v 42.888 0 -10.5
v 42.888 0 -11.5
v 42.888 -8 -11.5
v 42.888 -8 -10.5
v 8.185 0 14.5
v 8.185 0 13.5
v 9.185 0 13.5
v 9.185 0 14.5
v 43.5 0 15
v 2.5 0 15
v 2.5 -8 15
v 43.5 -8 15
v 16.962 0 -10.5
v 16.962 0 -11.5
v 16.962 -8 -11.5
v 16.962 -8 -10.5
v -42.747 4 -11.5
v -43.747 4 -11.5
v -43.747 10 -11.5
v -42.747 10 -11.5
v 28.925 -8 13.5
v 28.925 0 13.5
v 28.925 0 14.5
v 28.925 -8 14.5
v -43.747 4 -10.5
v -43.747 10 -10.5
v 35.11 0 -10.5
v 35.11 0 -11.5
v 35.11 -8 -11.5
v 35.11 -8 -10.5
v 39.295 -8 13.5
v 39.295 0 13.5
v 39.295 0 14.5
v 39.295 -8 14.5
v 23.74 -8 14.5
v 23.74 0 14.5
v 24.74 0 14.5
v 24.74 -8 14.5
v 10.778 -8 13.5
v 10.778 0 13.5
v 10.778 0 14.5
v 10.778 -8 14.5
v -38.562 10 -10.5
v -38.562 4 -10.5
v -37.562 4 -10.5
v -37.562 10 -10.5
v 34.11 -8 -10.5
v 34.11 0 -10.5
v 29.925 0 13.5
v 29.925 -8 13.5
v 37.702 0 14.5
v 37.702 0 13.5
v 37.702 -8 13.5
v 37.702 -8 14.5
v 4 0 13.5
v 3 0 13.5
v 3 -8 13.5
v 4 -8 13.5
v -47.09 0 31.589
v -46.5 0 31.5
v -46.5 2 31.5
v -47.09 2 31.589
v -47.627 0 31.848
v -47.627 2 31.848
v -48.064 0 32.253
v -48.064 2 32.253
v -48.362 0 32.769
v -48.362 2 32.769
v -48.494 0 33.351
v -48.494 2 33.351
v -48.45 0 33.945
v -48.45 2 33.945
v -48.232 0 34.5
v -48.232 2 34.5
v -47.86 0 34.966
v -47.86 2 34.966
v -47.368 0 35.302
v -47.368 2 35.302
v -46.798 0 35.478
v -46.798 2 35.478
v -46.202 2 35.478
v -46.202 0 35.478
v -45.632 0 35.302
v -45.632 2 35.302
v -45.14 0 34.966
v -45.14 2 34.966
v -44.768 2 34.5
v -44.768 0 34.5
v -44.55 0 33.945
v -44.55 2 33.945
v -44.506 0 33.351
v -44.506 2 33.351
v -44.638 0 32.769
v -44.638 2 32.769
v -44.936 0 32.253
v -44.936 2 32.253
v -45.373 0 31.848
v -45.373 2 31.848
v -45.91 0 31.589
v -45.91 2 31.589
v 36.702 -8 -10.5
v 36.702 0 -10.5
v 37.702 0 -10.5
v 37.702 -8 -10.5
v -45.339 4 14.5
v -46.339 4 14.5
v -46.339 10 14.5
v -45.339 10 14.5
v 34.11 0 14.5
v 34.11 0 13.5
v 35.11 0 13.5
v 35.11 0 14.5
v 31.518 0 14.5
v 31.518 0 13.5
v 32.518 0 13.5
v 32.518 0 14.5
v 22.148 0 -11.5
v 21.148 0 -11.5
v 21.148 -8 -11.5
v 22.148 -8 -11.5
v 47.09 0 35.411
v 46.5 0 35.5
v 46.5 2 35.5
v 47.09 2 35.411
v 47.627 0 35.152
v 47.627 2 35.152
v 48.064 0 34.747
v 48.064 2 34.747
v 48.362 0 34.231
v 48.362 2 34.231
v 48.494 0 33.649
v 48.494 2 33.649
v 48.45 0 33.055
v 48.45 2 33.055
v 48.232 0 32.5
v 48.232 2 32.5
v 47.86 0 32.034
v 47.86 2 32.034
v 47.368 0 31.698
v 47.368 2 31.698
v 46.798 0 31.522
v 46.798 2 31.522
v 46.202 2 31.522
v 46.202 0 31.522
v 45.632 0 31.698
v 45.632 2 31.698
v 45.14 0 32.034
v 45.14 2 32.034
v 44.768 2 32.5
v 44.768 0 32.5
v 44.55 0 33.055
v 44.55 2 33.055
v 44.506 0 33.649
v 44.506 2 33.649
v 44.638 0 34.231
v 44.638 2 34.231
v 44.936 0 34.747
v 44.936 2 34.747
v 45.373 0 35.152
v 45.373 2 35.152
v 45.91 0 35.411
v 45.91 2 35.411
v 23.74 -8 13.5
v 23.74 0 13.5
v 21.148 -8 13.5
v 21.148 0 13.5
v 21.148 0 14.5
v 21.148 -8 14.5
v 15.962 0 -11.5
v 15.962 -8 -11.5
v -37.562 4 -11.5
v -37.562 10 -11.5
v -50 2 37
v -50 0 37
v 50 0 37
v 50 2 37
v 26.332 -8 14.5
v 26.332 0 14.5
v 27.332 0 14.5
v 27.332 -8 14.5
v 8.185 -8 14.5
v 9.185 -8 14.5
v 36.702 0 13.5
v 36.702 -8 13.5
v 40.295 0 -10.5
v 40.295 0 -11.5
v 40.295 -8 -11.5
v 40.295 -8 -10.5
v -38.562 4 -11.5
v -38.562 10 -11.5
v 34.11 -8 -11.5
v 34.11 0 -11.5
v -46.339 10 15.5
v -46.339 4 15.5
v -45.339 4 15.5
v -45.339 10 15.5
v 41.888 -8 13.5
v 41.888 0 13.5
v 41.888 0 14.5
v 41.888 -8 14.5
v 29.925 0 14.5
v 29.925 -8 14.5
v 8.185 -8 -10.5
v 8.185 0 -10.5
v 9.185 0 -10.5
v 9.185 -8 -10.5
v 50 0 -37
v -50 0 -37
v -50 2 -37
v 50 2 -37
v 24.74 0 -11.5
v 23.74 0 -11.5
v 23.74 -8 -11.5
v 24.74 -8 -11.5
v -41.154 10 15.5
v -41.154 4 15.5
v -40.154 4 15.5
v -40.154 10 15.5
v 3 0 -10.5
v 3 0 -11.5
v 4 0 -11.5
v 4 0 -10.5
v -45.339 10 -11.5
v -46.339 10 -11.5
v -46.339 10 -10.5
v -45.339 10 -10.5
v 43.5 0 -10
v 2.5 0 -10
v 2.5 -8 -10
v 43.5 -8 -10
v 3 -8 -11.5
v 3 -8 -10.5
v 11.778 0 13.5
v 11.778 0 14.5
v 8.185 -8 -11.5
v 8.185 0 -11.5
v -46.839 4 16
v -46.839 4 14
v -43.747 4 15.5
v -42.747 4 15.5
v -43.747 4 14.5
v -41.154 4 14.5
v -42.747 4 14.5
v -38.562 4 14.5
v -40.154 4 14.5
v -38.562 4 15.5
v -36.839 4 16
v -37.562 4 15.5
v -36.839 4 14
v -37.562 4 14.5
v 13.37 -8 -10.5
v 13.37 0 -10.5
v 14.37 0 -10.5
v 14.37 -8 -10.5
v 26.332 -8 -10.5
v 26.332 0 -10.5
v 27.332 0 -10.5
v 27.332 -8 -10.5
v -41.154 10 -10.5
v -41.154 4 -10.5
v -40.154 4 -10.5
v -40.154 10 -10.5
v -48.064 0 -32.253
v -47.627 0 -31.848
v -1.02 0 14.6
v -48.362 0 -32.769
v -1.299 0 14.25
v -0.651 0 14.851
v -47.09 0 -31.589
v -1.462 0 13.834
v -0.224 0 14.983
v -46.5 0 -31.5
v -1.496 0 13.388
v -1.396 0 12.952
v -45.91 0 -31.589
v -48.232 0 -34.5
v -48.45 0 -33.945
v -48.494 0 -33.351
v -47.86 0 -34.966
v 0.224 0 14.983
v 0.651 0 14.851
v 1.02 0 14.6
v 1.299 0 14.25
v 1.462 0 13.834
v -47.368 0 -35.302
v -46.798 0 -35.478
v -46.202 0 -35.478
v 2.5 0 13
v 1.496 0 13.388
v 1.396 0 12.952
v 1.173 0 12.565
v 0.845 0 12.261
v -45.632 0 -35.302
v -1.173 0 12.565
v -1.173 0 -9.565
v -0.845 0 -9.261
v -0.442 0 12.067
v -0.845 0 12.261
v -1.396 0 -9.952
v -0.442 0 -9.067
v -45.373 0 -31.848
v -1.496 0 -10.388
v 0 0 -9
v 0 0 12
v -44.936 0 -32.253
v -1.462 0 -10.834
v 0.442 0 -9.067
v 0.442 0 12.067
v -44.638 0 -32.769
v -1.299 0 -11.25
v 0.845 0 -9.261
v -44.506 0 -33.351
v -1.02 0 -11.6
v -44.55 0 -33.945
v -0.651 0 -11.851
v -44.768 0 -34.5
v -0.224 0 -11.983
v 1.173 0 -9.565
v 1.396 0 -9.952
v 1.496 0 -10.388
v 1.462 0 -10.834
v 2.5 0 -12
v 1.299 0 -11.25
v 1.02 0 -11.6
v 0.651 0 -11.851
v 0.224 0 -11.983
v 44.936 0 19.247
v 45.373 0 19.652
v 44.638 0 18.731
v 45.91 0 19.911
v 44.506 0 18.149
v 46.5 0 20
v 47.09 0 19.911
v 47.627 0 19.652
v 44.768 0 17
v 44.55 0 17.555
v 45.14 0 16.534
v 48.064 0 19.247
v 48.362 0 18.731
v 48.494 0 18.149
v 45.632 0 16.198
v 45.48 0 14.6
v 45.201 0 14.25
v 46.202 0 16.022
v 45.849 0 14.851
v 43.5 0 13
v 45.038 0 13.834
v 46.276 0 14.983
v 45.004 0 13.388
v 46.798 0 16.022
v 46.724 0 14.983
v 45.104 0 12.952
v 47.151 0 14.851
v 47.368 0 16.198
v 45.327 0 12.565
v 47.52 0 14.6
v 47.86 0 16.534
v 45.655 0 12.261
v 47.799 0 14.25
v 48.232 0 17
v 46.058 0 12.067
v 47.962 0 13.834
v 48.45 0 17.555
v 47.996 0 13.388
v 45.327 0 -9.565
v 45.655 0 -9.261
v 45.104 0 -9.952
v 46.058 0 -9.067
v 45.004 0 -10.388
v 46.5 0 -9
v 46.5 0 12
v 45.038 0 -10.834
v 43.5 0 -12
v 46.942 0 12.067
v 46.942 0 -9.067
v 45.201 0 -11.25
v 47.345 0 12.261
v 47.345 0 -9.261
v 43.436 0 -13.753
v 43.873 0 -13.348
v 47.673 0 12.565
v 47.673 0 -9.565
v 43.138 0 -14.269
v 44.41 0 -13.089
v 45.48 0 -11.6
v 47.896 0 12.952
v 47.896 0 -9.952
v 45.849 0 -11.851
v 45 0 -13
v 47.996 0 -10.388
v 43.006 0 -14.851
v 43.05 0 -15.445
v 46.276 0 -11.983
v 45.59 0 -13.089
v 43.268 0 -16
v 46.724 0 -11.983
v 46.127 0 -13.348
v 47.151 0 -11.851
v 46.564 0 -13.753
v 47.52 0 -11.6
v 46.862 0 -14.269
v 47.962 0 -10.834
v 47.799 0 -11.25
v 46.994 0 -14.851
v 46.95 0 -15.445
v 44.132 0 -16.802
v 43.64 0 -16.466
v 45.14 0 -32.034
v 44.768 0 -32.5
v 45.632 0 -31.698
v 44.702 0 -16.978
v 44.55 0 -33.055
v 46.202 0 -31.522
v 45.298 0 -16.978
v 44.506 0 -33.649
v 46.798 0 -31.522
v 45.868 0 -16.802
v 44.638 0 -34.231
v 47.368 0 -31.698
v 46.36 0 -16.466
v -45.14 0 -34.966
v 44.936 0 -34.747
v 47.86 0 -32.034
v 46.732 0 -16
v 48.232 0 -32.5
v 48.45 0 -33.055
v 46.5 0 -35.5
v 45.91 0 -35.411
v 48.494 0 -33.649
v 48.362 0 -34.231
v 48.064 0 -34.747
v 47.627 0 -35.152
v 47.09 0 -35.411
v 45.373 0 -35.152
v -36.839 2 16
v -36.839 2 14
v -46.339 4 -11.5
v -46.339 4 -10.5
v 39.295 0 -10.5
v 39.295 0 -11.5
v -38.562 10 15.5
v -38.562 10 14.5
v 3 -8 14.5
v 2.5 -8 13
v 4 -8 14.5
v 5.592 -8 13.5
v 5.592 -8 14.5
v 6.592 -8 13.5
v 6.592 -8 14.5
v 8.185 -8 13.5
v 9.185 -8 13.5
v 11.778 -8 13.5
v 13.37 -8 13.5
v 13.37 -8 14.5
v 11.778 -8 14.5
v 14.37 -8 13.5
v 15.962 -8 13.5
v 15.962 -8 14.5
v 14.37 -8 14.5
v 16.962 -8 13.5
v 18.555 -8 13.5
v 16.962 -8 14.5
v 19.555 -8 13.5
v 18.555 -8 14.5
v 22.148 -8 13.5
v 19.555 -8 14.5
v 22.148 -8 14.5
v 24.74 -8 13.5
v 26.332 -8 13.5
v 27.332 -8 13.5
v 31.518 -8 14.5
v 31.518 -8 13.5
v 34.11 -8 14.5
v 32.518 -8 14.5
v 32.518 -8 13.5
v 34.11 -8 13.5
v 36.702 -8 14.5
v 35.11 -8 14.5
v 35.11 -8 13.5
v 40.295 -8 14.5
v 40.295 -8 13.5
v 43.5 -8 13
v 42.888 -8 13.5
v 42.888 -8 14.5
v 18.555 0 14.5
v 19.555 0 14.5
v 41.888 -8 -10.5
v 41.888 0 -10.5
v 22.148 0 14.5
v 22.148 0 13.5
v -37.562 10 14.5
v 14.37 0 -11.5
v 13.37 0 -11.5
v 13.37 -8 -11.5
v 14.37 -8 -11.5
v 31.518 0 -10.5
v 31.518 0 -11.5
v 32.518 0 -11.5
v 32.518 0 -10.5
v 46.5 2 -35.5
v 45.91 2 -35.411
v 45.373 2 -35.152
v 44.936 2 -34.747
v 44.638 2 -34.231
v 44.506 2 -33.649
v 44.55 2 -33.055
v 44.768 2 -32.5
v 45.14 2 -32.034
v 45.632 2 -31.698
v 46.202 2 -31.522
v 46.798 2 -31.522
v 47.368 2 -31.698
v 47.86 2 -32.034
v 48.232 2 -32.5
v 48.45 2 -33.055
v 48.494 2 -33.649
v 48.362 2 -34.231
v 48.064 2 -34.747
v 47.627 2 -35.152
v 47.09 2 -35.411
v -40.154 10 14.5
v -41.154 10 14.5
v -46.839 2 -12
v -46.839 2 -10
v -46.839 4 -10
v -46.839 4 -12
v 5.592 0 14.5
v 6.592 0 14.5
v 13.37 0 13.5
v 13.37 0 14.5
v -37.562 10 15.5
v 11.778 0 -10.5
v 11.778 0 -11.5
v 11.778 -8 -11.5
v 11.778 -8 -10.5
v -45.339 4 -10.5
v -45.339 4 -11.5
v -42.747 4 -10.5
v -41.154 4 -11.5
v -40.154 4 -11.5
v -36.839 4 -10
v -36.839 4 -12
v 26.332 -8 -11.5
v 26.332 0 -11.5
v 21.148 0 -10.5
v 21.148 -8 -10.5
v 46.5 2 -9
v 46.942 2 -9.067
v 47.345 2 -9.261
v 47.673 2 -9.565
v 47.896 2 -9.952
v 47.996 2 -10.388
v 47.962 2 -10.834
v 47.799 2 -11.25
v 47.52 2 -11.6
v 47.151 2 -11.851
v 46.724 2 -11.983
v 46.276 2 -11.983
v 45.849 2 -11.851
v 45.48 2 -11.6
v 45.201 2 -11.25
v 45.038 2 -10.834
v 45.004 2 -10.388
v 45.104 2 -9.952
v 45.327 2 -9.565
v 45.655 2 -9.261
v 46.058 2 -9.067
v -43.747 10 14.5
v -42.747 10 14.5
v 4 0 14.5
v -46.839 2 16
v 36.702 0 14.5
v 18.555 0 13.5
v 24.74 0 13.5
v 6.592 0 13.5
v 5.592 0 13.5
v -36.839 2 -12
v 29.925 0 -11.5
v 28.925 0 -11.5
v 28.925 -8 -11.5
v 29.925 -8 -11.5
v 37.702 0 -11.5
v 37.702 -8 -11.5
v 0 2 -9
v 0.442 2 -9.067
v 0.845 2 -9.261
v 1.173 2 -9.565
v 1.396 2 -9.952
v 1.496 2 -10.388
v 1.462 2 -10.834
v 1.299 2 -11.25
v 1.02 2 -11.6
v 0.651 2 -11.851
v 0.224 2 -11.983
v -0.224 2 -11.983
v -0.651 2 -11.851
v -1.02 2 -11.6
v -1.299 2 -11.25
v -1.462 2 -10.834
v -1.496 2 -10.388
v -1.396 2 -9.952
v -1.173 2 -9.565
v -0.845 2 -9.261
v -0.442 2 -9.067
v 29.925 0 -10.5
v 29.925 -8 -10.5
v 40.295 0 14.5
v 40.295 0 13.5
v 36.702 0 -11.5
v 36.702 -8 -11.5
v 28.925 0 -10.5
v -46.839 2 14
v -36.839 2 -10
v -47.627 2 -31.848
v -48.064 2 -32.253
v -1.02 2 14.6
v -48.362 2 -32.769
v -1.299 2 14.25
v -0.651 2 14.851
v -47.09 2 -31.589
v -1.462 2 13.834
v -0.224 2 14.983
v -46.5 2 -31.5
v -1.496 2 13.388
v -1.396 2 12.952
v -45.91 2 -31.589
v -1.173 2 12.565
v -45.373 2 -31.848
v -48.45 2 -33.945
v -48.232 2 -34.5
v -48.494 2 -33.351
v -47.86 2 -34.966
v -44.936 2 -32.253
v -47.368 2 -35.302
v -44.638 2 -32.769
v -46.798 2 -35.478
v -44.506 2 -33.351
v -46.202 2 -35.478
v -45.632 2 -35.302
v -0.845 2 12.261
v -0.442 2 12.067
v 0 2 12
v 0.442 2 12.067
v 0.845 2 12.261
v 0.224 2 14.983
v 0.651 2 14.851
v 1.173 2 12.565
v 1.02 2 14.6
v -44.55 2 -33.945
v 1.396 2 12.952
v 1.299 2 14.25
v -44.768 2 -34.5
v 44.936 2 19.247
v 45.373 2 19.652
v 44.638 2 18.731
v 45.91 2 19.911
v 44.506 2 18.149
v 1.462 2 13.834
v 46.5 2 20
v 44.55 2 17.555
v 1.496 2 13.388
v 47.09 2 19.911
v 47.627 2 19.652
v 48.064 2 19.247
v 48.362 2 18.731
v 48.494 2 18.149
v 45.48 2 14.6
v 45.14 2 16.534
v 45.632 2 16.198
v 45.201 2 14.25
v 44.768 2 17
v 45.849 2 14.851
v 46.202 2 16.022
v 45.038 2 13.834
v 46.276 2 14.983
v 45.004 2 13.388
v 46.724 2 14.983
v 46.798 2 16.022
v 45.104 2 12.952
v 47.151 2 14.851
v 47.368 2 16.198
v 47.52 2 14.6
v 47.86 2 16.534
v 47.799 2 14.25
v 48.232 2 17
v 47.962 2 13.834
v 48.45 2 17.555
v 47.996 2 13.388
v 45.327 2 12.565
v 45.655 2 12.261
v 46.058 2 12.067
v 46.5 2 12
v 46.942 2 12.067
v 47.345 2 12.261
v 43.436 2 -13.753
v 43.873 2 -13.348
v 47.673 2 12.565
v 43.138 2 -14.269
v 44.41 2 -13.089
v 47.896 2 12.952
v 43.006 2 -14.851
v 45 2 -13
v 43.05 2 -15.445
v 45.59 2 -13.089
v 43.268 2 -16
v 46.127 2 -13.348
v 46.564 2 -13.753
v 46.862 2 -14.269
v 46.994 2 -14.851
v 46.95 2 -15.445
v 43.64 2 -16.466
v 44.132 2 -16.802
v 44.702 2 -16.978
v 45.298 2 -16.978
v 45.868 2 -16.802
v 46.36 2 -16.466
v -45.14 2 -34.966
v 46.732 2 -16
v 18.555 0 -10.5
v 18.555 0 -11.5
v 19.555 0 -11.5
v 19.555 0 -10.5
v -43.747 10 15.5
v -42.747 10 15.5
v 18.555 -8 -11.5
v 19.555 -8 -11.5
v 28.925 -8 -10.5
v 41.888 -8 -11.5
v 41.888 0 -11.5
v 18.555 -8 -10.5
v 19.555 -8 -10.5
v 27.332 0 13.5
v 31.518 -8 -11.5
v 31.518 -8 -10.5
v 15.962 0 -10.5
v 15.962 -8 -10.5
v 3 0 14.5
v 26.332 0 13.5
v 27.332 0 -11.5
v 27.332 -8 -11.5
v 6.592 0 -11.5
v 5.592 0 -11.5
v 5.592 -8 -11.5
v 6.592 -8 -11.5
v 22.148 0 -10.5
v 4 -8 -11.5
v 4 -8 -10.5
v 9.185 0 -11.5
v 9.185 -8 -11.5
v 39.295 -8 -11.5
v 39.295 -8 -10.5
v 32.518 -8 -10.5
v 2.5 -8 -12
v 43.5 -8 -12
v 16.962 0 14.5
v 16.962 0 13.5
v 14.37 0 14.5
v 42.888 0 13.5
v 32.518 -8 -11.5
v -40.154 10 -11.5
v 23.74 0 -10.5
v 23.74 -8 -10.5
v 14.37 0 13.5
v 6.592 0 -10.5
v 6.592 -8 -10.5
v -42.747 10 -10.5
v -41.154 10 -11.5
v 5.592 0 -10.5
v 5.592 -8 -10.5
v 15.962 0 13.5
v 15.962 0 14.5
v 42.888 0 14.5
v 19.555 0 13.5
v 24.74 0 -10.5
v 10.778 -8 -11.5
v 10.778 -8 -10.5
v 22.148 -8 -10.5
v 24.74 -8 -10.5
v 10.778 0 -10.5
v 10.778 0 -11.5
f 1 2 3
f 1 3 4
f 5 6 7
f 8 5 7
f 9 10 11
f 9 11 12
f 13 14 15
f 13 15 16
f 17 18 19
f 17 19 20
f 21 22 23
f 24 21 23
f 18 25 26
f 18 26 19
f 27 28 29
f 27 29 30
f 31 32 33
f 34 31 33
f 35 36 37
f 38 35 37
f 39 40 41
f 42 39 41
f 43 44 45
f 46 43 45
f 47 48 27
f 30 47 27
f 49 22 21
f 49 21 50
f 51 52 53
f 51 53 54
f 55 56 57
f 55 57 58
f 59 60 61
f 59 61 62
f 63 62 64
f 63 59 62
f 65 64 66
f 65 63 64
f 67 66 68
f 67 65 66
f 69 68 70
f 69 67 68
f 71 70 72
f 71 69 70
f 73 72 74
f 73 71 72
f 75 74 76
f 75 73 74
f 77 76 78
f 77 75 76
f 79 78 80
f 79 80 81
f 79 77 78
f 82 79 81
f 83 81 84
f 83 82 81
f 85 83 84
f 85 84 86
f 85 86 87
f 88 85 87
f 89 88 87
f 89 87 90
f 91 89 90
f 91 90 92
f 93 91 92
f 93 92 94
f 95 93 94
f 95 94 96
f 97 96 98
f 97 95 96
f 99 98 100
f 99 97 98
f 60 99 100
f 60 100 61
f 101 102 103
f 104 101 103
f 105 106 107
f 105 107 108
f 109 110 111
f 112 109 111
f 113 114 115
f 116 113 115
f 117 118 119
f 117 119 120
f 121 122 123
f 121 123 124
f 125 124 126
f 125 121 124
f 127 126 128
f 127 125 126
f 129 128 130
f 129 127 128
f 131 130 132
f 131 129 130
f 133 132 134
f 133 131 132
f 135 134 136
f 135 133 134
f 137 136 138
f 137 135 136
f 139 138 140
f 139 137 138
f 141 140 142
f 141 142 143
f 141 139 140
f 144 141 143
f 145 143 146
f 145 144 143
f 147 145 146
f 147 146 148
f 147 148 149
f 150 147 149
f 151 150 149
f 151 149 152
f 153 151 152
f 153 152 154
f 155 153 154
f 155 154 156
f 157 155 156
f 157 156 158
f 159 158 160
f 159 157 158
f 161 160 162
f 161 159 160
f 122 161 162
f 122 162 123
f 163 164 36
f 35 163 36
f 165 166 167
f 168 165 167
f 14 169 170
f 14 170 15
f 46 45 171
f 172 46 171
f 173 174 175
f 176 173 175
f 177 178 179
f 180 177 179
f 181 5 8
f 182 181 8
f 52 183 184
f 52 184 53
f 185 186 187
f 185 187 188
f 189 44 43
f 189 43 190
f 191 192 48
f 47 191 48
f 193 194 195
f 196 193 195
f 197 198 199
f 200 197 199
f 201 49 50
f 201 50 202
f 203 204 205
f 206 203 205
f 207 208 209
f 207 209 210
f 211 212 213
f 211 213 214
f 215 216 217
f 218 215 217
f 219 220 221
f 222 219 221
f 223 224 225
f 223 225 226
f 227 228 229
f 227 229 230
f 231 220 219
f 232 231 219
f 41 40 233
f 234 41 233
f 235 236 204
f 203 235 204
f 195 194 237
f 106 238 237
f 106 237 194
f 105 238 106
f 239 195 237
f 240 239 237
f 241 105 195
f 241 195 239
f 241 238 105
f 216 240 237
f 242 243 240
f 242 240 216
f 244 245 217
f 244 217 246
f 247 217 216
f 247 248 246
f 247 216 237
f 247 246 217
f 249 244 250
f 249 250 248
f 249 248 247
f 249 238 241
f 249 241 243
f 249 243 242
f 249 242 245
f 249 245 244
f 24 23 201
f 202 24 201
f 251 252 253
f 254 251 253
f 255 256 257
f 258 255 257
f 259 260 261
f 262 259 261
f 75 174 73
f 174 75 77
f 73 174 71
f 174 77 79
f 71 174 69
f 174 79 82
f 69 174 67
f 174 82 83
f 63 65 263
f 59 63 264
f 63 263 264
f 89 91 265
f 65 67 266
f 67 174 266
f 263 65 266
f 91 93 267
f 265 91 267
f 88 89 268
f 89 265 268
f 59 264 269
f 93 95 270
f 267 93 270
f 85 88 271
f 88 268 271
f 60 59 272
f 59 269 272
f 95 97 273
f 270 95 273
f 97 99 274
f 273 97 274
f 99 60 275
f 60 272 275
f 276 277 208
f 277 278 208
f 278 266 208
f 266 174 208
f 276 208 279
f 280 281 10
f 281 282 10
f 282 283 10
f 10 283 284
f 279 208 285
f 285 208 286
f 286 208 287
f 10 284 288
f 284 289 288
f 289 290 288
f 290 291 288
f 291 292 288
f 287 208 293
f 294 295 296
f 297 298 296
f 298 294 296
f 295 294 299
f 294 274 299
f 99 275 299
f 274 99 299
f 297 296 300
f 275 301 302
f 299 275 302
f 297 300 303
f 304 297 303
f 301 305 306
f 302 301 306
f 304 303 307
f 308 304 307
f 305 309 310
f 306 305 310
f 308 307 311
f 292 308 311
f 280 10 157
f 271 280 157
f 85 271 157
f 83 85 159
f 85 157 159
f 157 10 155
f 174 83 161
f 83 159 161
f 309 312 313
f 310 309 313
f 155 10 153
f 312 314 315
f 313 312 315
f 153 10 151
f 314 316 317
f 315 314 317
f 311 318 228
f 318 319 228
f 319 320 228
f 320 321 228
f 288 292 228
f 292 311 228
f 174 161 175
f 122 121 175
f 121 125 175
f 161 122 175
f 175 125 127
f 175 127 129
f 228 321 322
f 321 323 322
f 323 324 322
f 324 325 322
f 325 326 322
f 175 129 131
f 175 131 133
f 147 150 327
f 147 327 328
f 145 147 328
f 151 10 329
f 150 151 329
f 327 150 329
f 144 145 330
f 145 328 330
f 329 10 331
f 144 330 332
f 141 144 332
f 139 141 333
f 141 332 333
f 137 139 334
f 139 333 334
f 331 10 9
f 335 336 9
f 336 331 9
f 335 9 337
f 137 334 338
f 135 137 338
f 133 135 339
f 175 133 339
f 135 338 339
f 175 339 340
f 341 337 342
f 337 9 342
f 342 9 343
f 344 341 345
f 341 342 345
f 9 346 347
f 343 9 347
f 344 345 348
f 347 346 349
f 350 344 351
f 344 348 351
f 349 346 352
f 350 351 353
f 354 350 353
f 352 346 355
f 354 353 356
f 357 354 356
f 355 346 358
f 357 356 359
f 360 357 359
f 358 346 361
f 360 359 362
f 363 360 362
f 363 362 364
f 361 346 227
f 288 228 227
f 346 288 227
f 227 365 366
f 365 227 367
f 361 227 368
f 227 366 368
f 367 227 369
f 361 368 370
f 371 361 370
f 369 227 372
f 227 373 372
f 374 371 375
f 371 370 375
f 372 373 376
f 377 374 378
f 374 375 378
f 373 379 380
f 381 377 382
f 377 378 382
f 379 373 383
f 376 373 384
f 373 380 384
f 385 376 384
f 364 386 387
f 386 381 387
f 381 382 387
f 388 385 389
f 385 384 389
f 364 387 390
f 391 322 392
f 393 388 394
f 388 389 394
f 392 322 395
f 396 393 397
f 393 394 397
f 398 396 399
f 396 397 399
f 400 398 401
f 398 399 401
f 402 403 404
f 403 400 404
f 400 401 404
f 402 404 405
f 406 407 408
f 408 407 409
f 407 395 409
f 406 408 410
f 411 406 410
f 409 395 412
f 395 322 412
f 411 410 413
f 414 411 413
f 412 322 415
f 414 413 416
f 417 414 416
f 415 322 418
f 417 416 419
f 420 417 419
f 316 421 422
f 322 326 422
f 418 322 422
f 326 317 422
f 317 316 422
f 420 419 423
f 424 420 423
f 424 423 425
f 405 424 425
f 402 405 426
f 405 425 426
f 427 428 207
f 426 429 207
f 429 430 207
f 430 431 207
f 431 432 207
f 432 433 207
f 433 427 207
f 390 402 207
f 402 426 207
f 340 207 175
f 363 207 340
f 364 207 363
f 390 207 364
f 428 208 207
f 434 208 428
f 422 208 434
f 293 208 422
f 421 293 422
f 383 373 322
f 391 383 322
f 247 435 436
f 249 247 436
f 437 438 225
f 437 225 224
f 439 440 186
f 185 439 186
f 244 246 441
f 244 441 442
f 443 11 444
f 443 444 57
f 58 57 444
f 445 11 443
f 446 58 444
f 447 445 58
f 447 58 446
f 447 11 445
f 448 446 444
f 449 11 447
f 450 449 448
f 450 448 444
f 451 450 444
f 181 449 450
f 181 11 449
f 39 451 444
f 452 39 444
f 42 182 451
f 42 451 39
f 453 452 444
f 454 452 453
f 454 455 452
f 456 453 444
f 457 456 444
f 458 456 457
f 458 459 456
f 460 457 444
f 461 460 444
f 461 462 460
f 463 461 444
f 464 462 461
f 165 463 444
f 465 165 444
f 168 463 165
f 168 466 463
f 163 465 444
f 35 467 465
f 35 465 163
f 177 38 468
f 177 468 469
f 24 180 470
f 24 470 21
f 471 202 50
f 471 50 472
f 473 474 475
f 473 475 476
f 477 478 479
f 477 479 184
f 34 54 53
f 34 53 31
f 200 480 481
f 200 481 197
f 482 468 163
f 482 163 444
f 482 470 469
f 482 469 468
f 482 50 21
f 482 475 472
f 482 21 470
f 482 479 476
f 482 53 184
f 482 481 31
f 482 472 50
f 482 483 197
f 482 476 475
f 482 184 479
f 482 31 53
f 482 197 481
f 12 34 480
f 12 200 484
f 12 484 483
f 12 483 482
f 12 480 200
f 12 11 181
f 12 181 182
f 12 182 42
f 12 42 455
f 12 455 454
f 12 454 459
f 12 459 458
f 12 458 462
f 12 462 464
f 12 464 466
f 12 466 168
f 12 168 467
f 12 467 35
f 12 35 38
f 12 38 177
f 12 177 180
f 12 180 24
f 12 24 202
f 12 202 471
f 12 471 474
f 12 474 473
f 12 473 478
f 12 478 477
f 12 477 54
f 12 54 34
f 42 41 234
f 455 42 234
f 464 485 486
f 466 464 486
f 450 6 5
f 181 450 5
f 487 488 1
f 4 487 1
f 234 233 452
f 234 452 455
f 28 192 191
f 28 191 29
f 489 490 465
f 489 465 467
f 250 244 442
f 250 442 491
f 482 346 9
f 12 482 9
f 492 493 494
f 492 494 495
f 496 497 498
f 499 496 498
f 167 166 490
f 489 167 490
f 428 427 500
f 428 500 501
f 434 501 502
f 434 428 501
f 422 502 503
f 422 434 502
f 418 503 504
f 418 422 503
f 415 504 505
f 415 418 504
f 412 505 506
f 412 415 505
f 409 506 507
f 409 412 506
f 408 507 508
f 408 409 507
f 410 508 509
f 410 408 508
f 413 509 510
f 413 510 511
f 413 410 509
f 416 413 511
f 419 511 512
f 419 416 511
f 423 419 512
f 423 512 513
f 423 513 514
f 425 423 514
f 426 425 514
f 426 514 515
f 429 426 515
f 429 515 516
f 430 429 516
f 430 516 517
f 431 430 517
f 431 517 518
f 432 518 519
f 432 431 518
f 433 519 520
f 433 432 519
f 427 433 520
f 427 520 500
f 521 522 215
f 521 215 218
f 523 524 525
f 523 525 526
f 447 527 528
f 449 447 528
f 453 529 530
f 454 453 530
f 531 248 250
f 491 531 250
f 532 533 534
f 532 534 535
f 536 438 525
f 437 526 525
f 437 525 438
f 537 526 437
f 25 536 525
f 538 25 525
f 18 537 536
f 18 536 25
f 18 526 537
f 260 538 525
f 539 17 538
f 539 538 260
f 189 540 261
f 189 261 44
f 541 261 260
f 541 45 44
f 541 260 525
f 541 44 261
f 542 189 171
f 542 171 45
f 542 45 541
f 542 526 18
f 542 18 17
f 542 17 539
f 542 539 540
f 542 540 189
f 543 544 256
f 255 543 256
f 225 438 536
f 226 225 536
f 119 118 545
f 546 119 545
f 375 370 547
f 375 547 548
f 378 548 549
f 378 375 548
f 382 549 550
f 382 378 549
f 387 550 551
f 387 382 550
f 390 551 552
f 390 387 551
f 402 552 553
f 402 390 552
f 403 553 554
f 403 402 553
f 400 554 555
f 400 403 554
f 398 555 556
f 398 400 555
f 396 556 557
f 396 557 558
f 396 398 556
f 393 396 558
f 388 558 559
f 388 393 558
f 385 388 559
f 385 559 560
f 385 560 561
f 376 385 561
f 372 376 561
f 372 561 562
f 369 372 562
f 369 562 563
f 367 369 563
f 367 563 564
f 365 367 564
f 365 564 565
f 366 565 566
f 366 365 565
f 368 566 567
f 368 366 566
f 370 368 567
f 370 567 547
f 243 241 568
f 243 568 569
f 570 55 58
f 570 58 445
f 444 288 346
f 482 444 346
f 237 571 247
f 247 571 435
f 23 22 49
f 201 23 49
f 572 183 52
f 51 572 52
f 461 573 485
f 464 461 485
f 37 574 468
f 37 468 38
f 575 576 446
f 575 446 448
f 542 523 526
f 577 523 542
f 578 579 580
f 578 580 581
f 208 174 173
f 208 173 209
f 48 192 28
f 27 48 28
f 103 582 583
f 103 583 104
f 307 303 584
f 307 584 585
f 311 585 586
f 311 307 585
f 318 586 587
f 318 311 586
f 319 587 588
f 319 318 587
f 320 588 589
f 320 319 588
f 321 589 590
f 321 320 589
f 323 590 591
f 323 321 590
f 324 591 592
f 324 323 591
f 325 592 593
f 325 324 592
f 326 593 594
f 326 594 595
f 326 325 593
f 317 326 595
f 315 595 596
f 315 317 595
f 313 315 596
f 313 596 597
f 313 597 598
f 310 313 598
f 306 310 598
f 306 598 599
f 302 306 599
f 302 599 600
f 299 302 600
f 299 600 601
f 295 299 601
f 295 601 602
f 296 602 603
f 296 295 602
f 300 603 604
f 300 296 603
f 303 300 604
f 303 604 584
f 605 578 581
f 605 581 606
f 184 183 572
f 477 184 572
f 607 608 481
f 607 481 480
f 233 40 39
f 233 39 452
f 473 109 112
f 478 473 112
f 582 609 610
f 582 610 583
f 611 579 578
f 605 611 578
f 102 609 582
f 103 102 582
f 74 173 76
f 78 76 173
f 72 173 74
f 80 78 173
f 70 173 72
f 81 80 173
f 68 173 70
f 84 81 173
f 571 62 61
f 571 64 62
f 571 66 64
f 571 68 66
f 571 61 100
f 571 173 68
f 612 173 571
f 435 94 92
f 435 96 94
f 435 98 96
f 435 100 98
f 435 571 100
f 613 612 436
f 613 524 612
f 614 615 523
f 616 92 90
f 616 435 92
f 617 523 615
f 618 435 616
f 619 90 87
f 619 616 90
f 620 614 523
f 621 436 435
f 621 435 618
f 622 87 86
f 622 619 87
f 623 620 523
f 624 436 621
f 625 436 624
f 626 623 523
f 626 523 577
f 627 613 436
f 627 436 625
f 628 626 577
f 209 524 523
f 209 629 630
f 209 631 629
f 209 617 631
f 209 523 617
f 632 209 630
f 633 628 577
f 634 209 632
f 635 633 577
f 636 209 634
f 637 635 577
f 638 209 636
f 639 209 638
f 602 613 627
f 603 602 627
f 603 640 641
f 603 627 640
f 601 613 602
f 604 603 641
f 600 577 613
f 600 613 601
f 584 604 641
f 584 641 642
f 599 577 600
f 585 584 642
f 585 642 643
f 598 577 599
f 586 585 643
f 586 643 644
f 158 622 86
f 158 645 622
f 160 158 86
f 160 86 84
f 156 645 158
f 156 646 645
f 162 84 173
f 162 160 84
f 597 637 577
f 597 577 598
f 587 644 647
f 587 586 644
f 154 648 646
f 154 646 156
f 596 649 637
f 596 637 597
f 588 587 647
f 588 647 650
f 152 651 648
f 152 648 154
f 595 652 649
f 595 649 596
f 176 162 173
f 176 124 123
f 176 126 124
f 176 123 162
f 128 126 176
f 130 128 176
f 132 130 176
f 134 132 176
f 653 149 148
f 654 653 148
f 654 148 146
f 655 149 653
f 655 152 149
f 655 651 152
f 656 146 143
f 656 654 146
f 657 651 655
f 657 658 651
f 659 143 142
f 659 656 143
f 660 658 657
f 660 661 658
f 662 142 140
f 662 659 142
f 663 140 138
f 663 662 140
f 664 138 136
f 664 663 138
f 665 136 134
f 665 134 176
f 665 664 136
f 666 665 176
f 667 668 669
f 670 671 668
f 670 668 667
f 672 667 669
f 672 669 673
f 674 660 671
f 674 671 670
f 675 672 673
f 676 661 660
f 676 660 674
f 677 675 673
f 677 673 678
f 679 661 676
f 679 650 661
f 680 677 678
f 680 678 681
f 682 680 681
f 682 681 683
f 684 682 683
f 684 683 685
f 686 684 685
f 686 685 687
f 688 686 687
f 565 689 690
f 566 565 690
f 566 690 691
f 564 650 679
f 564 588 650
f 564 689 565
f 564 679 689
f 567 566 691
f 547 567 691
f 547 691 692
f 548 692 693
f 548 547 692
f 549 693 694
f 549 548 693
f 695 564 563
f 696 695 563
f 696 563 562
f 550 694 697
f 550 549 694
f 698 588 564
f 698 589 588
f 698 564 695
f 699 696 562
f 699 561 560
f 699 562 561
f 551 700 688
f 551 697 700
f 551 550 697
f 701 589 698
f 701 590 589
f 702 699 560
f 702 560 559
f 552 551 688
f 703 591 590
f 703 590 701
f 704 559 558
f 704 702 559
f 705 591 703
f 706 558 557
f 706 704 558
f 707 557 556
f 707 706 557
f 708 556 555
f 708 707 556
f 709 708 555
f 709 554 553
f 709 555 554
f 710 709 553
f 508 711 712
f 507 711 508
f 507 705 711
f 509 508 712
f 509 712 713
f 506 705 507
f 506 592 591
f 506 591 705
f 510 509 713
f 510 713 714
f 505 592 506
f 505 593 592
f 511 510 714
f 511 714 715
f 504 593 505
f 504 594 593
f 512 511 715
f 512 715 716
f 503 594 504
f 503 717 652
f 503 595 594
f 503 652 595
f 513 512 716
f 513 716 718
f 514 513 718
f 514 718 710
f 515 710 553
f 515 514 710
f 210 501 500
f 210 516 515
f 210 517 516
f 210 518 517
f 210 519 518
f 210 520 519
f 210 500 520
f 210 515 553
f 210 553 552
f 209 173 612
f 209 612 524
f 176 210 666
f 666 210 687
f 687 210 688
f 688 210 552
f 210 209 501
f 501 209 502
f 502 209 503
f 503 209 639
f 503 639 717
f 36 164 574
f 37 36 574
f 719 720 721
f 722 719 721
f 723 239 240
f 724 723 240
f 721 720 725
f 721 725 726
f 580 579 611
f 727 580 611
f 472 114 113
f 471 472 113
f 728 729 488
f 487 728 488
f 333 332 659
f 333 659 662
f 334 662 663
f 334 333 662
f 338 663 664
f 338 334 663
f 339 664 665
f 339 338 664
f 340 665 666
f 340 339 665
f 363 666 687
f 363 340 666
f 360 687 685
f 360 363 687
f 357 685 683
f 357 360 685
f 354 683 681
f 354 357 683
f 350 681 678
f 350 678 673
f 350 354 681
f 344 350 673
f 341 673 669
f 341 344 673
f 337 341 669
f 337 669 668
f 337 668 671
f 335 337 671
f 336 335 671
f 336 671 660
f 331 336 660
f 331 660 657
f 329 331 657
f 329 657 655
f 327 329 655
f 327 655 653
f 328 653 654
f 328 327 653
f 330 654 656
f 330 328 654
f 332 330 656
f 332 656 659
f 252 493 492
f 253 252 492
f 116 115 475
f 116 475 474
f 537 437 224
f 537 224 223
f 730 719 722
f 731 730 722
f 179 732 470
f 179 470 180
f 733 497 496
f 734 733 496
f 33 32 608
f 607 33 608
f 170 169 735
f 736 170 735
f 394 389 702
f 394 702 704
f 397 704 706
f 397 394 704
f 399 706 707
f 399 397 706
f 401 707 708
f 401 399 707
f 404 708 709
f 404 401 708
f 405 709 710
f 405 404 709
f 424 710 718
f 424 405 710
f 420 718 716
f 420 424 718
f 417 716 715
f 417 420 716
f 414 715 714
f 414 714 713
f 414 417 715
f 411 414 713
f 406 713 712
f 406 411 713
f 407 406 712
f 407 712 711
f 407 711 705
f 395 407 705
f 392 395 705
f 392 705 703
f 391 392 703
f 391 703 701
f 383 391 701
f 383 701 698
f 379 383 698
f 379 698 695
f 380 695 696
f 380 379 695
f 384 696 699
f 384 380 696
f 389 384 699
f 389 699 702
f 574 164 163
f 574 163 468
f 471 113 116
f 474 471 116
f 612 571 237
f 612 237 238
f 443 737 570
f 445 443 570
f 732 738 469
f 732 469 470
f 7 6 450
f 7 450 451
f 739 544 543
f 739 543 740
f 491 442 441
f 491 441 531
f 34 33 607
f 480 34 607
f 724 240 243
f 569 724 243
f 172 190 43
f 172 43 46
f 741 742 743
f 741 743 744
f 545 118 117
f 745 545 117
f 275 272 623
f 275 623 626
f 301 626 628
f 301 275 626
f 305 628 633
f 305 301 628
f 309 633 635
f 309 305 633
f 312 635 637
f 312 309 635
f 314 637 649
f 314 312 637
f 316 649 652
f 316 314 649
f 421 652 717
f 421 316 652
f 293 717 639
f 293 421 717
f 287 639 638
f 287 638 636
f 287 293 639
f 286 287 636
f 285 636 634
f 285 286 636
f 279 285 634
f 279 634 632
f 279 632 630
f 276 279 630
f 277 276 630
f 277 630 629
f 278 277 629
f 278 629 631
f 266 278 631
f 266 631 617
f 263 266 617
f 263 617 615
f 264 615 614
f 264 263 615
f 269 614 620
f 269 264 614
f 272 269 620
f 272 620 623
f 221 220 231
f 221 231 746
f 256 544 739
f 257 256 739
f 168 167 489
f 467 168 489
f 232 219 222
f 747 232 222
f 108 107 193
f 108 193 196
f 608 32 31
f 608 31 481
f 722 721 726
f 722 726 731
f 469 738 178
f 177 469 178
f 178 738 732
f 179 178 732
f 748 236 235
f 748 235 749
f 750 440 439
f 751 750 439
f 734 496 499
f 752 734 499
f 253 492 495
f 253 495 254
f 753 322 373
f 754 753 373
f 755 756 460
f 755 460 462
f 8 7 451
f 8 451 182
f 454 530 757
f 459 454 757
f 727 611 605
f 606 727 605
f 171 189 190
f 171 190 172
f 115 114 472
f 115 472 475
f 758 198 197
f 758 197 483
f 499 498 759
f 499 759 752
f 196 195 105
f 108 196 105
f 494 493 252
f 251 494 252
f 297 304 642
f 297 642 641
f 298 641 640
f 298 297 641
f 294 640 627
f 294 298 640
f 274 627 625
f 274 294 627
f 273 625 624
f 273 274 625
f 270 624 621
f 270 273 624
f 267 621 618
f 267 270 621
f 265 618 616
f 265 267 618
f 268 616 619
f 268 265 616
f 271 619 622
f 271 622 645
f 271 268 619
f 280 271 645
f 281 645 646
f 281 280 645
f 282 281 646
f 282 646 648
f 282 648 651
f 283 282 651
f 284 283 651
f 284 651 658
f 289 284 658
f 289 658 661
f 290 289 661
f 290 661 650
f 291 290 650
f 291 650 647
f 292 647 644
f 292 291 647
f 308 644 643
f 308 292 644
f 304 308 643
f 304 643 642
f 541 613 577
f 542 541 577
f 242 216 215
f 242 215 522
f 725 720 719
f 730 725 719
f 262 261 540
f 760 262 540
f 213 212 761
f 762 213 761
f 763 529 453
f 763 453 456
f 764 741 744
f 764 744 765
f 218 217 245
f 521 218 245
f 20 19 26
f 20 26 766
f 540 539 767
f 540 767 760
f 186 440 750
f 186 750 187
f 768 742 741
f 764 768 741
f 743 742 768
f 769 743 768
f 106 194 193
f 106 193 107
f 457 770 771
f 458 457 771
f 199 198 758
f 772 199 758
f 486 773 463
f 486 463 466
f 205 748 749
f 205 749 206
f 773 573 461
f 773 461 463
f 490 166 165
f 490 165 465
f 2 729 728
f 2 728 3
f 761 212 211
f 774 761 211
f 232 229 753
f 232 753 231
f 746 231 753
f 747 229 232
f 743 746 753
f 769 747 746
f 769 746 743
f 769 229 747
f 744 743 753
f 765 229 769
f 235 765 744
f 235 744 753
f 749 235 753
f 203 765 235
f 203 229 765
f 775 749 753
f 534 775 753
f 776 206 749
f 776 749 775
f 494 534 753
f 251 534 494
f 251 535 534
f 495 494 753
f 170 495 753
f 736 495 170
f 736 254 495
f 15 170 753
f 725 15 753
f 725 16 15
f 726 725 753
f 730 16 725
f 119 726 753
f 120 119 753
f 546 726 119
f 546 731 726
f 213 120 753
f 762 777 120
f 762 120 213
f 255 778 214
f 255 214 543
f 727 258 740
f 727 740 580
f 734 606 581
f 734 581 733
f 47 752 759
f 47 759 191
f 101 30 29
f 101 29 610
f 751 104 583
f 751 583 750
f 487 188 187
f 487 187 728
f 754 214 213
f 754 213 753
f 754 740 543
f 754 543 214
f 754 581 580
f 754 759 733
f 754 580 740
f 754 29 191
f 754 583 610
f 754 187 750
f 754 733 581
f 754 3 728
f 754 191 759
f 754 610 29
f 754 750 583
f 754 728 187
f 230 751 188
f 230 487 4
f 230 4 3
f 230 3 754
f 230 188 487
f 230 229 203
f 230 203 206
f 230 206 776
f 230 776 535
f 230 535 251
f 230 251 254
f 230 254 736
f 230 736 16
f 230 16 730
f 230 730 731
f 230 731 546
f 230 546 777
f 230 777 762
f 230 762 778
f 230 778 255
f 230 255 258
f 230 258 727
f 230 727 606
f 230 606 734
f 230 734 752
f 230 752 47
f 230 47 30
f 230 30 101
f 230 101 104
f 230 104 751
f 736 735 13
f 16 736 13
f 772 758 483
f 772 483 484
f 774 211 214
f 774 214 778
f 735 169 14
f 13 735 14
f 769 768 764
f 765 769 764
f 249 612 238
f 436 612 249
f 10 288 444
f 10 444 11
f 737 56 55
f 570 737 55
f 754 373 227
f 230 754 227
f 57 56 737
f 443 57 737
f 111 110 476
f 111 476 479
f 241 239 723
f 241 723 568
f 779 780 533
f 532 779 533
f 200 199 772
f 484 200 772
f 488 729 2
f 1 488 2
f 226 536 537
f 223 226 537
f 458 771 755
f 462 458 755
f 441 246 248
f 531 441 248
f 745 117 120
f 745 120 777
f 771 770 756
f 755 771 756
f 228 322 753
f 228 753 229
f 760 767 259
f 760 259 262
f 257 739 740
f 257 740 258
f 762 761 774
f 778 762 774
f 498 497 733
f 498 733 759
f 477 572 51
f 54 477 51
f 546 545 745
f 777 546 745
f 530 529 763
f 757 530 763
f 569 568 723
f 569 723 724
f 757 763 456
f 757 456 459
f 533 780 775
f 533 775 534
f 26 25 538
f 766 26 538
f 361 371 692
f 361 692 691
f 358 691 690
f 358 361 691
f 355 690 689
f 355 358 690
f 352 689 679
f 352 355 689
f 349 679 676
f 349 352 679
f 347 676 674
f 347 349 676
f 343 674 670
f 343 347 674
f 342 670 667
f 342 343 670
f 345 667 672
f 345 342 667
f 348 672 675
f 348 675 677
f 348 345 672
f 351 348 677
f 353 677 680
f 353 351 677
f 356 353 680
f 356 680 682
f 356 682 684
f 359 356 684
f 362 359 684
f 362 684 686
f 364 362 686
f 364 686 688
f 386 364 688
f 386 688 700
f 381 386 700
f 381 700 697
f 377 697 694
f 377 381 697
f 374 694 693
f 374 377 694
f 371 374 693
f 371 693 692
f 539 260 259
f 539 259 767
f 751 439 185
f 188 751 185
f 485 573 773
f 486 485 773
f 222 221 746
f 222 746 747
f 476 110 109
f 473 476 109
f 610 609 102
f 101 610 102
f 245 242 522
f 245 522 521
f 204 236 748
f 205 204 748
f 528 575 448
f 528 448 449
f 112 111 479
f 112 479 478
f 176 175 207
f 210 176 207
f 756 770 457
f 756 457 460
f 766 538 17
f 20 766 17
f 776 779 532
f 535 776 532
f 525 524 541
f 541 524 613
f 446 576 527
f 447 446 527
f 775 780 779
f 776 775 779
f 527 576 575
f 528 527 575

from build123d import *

# Parameters (mm, degrees)
SKETCH1_W           = 100
SKETCH1_H           = 74
SKETCH1_R           = 2
SKETCH1_R_2         = 1.5
BOSS_EXTRUDE1_DEPTH = 2
SKETCH2_W           = 10
SKETCH2_H           = 2
BOSS_EXTRUDE2_DEPTH = 2
SKETCH3_W           = 41
SKETCH3_H           = 2
SKETCH3_W_2         = 1
SKETCH3_H_2         = 1
BOSS_EXTRUDE4_DEPTH = 8
SKETCH4_W           = 1
SKETCH4_H           = 1
BOSS_EXTRUDE5_DEPTH = 8


with BuildPart() as part:
    # Sketch1 → Boss-Extrude1 (new body)
    with BuildSketch(Plane(origin=(0, 0, 0), x_dir=(1, 0, 0), z_dir=(0, 1, 0))):
        Rectangle(SKETCH1_W, SKETCH1_H)
        with Locations(Location((-46.5, 33.5, 0), (0, 0, 270))):
            Circle(SKETCH1_R, mode=Mode.SUBTRACT)
        with Locations(Location((46.5, 33.5, 0), (0, 0, 90))):
            Circle(SKETCH1_R, mode=Mode.SUBTRACT)
        with Locations(Location((46.5, -33.5, 0), (0, 0, 270))):
            Circle(SKETCH1_R, mode=Mode.SUBTRACT)
        with Locations(Location((-46.5, -33.5, 0), (0, 0, 90))):
            Circle(SKETCH1_R, mode=Mode.SUBTRACT)
        with Locations(Location((46.5, -18, 0), (0, 0, 270))):
            Circle(SKETCH1_R, mode=Mode.SUBTRACT)
        with Locations(Location((45, 15, 0), (0, 0, 270))):
            Circle(SKETCH1_R, mode=Mode.SUBTRACT)
        with Locations(Location((0, 10.5, 0), (0, 0, 270))):
            Circle(SKETCH1_R_2, mode=Mode.SUBTRACT)
        with Locations(Location((46.5, 10.5, 0), (0, 0, 270))):
            Circle(SKETCH1_R_2, mode=Mode.SUBTRACT)
        with Locations(Location((46.5, -13.5, 0), (0, 0, 90))):
            Circle(SKETCH1_R_2, mode=Mode.SUBTRACT)
        with Locations(Location((0, -13.5, 0), (0, 0, 90))):
            Circle(SKETCH1_R_2, mode=Mode.SUBTRACT)
    extrude(amount=BOSS_EXTRUDE1_DEPTH)

    # Sketch2 → Boss-Extrude2 (add)
    with BuildSketch(Plane(origin=(0, 2, 0), x_dir=(1, 0, 0), z_dir=(0, 1, 0))):
        with Locations((-41.839490028, 11)):
            Rectangle(SKETCH2_W, SKETCH2_H)
        with Locations((-41.839490028, -15)):
            Rectangle(SKETCH2_W, SKETCH2_H)
    extrude(amount=BOSS_EXTRUDE2_DEPTH)

    # Sketch3 → Boss-Extrude4 (add)
    # profile 1 of 2: a face of its own
    with BuildSketch(Plane.XZ):
        with Locations((23, 14)):
            Rectangle(SKETCH3_W, SKETCH3_H)
        with Locations((3.5, 14)):
            Rectangle(SKETCH3_W_2, SKETCH3_H_2, mode=Mode.SUBTRACT)
        with Locations((6.0925, 14)):
            Rectangle(SKETCH3_W_2, SKETCH3_H_2, mode=Mode.SUBTRACT)
        with Locations((8.685, 14)):
            Rectangle(SKETCH3_W_2, SKETCH3_H_2, mode=Mode.SUBTRACT)
        with Locations((11.2775, 14)):
            Rectangle(SKETCH3_W_2, SKETCH3_H_2, mode=Mode.SUBTRACT)
        with Locations((13.87, 14)):
            Rectangle(SKETCH3_W_2, SKETCH3_H_2, mode=Mode.SUBTRACT)
        with Locations((16.4625, 14)):
            Rectangle(SKETCH3_W_2, SKETCH3_H_2, mode=Mode.SUBTRACT)
        with Locations((19.055, 14)):
            Rectangle(SKETCH3_W_2, SKETCH3_H_2, mode=Mode.SUBTRACT)
        with Locations((21.6475, 14)):
            Rectangle(SKETCH3_W_2, SKETCH3_H_2, mode=Mode.SUBTRACT)
        with Locations((24.24, 14)):
            Rectangle(SKETCH3_W_2, SKETCH3_H_2, mode=Mode.SUBTRACT)
        with Locations((26.8325, 14)):
            Rectangle(SKETCH3_W_2, SKETCH3_H_2, mode=Mode.SUBTRACT)
        with Locations((29.425, 14)):
            Rectangle(SKETCH3_W_2, SKETCH3_H_2, mode=Mode.SUBTRACT)
        with Locations((32.0175, 14)):
            Rectangle(SKETCH3_W_2, SKETCH3_H_2, mode=Mode.SUBTRACT)
        with Locations((34.61, 14)):
            Rectangle(SKETCH3_W_2, SKETCH3_H_2, mode=Mode.SUBTRACT)
        with Locations((37.2025, 14)):
            Rectangle(SKETCH3_W_2, SKETCH3_H_2, mode=Mode.SUBTRACT)
        with Locations((39.795, 14)):
            Rectangle(SKETCH3_W_2, SKETCH3_H_2, mode=Mode.SUBTRACT)
        with Locations((42.3875, 14)):
            Rectangle(SKETCH3_W_2, SKETCH3_H_2, mode=Mode.SUBTRACT)
    # profile 2 of 2: a face of its own
    with BuildSketch(Plane.XZ):
        with Locations((23, -11)):
            Rectangle(SKETCH3_W, SKETCH3_H)
        with Locations((42.3875, -11)):
            Rectangle(SKETCH3_W_2, SKETCH3_H_2, mode=Mode.SUBTRACT)
        with Locations((39.795, -11)):
            Rectangle(SKETCH3_W_2, SKETCH3_H_2, mode=Mode.SUBTRACT)
        with Locations((37.2025, -11)):
            Rectangle(SKETCH3_W_2, SKETCH3_H_2, mode=Mode.SUBTRACT)
        with Locations((34.61, -11)):
            Rectangle(SKETCH3_W_2, SKETCH3_H_2, mode=Mode.SUBTRACT)
        with Locations((32.0175, -11)):
            Rectangle(SKETCH3_W_2, SKETCH3_H_2, mode=Mode.SUBTRACT)
        with Locations((29.425, -11)):
            Rectangle(SKETCH3_W_2, SKETCH3_H_2, mode=Mode.SUBTRACT)
        with Locations((26.8325, -11)):
            Rectangle(SKETCH3_W_2, SKETCH3_H_2, mode=Mode.SUBTRACT)
        with Locations((24.24, -11)):
            Rectangle(SKETCH3_W_2, SKETCH3_H_2, mode=Mode.SUBTRACT)
        with Locations((21.6475, -11)):
            Rectangle(SKETCH3_W_2, SKETCH3_H_2, mode=Mode.SUBTRACT)
        with Locations((19.055, -11)):
            Rectangle(SKETCH3_W_2, SKETCH3_H_2, mode=Mode.SUBTRACT)
        with Locations((16.4625, -11)):
            Rectangle(SKETCH3_W_2, SKETCH3_H_2, mode=Mode.SUBTRACT)
        with Locations((13.87, -11)):
            Rectangle(SKETCH3_W_2, SKETCH3_H_2, mode=Mode.SUBTRACT)
        with Locations((11.2775, -11)):
            Rectangle(SKETCH3_W_2, SKETCH3_H_2, mode=Mode.SUBTRACT)
        with Locations((8.685, -11)):
            Rectangle(SKETCH3_W_2, SKETCH3_H_2, mode=Mode.SUBTRACT)
        with Locations((6.0925, -11)):
            Rectangle(SKETCH3_W_2, SKETCH3_H_2, mode=Mode.SUBTRACT)
        with Locations((3.5, -11)):
            Rectangle(SKETCH3_W_2, SKETCH3_H_2, mode=Mode.SUBTRACT)
    extrude(amount=BOSS_EXTRUDE4_DEPTH)

    # Sketch4 → Boss-Extrude5 (add)
    with BuildSketch(Plane(origin=(0, 2, 0), x_dir=(1, 0, 0), z_dir=(0, 1, 0))):
        with Locations((-45.839490028, 11)):
            Rectangle(SKETCH4_W, SKETCH4_H)
        with Locations((-43.246990028, 11)):
            Rectangle(SKETCH4_W, SKETCH4_H)
        with Locations((-40.654490028, 11)):
            Rectangle(SKETCH4_W, SKETCH4_H)
        with Locations((-38.061990028, 11)):
            Rectangle(SKETCH4_W, SKETCH4_H)
        with Locations((-38.061990028, -15)):
            Rectangle(SKETCH4_W, SKETCH4_H)
        with Locations((-40.654490028, -15)):
            Rectangle(SKETCH4_W, SKETCH4_H)
        with Locations((-43.246990028, -15)):
            Rectangle(SKETCH4_W, SKETCH4_H)
        with Locations((-45.839490028, -15)):
            Rectangle(SKETCH4_W, SKETCH4_H)
    extrude(amount=BOSS_EXTRUDE5_DEPTH)


solid = part.part
